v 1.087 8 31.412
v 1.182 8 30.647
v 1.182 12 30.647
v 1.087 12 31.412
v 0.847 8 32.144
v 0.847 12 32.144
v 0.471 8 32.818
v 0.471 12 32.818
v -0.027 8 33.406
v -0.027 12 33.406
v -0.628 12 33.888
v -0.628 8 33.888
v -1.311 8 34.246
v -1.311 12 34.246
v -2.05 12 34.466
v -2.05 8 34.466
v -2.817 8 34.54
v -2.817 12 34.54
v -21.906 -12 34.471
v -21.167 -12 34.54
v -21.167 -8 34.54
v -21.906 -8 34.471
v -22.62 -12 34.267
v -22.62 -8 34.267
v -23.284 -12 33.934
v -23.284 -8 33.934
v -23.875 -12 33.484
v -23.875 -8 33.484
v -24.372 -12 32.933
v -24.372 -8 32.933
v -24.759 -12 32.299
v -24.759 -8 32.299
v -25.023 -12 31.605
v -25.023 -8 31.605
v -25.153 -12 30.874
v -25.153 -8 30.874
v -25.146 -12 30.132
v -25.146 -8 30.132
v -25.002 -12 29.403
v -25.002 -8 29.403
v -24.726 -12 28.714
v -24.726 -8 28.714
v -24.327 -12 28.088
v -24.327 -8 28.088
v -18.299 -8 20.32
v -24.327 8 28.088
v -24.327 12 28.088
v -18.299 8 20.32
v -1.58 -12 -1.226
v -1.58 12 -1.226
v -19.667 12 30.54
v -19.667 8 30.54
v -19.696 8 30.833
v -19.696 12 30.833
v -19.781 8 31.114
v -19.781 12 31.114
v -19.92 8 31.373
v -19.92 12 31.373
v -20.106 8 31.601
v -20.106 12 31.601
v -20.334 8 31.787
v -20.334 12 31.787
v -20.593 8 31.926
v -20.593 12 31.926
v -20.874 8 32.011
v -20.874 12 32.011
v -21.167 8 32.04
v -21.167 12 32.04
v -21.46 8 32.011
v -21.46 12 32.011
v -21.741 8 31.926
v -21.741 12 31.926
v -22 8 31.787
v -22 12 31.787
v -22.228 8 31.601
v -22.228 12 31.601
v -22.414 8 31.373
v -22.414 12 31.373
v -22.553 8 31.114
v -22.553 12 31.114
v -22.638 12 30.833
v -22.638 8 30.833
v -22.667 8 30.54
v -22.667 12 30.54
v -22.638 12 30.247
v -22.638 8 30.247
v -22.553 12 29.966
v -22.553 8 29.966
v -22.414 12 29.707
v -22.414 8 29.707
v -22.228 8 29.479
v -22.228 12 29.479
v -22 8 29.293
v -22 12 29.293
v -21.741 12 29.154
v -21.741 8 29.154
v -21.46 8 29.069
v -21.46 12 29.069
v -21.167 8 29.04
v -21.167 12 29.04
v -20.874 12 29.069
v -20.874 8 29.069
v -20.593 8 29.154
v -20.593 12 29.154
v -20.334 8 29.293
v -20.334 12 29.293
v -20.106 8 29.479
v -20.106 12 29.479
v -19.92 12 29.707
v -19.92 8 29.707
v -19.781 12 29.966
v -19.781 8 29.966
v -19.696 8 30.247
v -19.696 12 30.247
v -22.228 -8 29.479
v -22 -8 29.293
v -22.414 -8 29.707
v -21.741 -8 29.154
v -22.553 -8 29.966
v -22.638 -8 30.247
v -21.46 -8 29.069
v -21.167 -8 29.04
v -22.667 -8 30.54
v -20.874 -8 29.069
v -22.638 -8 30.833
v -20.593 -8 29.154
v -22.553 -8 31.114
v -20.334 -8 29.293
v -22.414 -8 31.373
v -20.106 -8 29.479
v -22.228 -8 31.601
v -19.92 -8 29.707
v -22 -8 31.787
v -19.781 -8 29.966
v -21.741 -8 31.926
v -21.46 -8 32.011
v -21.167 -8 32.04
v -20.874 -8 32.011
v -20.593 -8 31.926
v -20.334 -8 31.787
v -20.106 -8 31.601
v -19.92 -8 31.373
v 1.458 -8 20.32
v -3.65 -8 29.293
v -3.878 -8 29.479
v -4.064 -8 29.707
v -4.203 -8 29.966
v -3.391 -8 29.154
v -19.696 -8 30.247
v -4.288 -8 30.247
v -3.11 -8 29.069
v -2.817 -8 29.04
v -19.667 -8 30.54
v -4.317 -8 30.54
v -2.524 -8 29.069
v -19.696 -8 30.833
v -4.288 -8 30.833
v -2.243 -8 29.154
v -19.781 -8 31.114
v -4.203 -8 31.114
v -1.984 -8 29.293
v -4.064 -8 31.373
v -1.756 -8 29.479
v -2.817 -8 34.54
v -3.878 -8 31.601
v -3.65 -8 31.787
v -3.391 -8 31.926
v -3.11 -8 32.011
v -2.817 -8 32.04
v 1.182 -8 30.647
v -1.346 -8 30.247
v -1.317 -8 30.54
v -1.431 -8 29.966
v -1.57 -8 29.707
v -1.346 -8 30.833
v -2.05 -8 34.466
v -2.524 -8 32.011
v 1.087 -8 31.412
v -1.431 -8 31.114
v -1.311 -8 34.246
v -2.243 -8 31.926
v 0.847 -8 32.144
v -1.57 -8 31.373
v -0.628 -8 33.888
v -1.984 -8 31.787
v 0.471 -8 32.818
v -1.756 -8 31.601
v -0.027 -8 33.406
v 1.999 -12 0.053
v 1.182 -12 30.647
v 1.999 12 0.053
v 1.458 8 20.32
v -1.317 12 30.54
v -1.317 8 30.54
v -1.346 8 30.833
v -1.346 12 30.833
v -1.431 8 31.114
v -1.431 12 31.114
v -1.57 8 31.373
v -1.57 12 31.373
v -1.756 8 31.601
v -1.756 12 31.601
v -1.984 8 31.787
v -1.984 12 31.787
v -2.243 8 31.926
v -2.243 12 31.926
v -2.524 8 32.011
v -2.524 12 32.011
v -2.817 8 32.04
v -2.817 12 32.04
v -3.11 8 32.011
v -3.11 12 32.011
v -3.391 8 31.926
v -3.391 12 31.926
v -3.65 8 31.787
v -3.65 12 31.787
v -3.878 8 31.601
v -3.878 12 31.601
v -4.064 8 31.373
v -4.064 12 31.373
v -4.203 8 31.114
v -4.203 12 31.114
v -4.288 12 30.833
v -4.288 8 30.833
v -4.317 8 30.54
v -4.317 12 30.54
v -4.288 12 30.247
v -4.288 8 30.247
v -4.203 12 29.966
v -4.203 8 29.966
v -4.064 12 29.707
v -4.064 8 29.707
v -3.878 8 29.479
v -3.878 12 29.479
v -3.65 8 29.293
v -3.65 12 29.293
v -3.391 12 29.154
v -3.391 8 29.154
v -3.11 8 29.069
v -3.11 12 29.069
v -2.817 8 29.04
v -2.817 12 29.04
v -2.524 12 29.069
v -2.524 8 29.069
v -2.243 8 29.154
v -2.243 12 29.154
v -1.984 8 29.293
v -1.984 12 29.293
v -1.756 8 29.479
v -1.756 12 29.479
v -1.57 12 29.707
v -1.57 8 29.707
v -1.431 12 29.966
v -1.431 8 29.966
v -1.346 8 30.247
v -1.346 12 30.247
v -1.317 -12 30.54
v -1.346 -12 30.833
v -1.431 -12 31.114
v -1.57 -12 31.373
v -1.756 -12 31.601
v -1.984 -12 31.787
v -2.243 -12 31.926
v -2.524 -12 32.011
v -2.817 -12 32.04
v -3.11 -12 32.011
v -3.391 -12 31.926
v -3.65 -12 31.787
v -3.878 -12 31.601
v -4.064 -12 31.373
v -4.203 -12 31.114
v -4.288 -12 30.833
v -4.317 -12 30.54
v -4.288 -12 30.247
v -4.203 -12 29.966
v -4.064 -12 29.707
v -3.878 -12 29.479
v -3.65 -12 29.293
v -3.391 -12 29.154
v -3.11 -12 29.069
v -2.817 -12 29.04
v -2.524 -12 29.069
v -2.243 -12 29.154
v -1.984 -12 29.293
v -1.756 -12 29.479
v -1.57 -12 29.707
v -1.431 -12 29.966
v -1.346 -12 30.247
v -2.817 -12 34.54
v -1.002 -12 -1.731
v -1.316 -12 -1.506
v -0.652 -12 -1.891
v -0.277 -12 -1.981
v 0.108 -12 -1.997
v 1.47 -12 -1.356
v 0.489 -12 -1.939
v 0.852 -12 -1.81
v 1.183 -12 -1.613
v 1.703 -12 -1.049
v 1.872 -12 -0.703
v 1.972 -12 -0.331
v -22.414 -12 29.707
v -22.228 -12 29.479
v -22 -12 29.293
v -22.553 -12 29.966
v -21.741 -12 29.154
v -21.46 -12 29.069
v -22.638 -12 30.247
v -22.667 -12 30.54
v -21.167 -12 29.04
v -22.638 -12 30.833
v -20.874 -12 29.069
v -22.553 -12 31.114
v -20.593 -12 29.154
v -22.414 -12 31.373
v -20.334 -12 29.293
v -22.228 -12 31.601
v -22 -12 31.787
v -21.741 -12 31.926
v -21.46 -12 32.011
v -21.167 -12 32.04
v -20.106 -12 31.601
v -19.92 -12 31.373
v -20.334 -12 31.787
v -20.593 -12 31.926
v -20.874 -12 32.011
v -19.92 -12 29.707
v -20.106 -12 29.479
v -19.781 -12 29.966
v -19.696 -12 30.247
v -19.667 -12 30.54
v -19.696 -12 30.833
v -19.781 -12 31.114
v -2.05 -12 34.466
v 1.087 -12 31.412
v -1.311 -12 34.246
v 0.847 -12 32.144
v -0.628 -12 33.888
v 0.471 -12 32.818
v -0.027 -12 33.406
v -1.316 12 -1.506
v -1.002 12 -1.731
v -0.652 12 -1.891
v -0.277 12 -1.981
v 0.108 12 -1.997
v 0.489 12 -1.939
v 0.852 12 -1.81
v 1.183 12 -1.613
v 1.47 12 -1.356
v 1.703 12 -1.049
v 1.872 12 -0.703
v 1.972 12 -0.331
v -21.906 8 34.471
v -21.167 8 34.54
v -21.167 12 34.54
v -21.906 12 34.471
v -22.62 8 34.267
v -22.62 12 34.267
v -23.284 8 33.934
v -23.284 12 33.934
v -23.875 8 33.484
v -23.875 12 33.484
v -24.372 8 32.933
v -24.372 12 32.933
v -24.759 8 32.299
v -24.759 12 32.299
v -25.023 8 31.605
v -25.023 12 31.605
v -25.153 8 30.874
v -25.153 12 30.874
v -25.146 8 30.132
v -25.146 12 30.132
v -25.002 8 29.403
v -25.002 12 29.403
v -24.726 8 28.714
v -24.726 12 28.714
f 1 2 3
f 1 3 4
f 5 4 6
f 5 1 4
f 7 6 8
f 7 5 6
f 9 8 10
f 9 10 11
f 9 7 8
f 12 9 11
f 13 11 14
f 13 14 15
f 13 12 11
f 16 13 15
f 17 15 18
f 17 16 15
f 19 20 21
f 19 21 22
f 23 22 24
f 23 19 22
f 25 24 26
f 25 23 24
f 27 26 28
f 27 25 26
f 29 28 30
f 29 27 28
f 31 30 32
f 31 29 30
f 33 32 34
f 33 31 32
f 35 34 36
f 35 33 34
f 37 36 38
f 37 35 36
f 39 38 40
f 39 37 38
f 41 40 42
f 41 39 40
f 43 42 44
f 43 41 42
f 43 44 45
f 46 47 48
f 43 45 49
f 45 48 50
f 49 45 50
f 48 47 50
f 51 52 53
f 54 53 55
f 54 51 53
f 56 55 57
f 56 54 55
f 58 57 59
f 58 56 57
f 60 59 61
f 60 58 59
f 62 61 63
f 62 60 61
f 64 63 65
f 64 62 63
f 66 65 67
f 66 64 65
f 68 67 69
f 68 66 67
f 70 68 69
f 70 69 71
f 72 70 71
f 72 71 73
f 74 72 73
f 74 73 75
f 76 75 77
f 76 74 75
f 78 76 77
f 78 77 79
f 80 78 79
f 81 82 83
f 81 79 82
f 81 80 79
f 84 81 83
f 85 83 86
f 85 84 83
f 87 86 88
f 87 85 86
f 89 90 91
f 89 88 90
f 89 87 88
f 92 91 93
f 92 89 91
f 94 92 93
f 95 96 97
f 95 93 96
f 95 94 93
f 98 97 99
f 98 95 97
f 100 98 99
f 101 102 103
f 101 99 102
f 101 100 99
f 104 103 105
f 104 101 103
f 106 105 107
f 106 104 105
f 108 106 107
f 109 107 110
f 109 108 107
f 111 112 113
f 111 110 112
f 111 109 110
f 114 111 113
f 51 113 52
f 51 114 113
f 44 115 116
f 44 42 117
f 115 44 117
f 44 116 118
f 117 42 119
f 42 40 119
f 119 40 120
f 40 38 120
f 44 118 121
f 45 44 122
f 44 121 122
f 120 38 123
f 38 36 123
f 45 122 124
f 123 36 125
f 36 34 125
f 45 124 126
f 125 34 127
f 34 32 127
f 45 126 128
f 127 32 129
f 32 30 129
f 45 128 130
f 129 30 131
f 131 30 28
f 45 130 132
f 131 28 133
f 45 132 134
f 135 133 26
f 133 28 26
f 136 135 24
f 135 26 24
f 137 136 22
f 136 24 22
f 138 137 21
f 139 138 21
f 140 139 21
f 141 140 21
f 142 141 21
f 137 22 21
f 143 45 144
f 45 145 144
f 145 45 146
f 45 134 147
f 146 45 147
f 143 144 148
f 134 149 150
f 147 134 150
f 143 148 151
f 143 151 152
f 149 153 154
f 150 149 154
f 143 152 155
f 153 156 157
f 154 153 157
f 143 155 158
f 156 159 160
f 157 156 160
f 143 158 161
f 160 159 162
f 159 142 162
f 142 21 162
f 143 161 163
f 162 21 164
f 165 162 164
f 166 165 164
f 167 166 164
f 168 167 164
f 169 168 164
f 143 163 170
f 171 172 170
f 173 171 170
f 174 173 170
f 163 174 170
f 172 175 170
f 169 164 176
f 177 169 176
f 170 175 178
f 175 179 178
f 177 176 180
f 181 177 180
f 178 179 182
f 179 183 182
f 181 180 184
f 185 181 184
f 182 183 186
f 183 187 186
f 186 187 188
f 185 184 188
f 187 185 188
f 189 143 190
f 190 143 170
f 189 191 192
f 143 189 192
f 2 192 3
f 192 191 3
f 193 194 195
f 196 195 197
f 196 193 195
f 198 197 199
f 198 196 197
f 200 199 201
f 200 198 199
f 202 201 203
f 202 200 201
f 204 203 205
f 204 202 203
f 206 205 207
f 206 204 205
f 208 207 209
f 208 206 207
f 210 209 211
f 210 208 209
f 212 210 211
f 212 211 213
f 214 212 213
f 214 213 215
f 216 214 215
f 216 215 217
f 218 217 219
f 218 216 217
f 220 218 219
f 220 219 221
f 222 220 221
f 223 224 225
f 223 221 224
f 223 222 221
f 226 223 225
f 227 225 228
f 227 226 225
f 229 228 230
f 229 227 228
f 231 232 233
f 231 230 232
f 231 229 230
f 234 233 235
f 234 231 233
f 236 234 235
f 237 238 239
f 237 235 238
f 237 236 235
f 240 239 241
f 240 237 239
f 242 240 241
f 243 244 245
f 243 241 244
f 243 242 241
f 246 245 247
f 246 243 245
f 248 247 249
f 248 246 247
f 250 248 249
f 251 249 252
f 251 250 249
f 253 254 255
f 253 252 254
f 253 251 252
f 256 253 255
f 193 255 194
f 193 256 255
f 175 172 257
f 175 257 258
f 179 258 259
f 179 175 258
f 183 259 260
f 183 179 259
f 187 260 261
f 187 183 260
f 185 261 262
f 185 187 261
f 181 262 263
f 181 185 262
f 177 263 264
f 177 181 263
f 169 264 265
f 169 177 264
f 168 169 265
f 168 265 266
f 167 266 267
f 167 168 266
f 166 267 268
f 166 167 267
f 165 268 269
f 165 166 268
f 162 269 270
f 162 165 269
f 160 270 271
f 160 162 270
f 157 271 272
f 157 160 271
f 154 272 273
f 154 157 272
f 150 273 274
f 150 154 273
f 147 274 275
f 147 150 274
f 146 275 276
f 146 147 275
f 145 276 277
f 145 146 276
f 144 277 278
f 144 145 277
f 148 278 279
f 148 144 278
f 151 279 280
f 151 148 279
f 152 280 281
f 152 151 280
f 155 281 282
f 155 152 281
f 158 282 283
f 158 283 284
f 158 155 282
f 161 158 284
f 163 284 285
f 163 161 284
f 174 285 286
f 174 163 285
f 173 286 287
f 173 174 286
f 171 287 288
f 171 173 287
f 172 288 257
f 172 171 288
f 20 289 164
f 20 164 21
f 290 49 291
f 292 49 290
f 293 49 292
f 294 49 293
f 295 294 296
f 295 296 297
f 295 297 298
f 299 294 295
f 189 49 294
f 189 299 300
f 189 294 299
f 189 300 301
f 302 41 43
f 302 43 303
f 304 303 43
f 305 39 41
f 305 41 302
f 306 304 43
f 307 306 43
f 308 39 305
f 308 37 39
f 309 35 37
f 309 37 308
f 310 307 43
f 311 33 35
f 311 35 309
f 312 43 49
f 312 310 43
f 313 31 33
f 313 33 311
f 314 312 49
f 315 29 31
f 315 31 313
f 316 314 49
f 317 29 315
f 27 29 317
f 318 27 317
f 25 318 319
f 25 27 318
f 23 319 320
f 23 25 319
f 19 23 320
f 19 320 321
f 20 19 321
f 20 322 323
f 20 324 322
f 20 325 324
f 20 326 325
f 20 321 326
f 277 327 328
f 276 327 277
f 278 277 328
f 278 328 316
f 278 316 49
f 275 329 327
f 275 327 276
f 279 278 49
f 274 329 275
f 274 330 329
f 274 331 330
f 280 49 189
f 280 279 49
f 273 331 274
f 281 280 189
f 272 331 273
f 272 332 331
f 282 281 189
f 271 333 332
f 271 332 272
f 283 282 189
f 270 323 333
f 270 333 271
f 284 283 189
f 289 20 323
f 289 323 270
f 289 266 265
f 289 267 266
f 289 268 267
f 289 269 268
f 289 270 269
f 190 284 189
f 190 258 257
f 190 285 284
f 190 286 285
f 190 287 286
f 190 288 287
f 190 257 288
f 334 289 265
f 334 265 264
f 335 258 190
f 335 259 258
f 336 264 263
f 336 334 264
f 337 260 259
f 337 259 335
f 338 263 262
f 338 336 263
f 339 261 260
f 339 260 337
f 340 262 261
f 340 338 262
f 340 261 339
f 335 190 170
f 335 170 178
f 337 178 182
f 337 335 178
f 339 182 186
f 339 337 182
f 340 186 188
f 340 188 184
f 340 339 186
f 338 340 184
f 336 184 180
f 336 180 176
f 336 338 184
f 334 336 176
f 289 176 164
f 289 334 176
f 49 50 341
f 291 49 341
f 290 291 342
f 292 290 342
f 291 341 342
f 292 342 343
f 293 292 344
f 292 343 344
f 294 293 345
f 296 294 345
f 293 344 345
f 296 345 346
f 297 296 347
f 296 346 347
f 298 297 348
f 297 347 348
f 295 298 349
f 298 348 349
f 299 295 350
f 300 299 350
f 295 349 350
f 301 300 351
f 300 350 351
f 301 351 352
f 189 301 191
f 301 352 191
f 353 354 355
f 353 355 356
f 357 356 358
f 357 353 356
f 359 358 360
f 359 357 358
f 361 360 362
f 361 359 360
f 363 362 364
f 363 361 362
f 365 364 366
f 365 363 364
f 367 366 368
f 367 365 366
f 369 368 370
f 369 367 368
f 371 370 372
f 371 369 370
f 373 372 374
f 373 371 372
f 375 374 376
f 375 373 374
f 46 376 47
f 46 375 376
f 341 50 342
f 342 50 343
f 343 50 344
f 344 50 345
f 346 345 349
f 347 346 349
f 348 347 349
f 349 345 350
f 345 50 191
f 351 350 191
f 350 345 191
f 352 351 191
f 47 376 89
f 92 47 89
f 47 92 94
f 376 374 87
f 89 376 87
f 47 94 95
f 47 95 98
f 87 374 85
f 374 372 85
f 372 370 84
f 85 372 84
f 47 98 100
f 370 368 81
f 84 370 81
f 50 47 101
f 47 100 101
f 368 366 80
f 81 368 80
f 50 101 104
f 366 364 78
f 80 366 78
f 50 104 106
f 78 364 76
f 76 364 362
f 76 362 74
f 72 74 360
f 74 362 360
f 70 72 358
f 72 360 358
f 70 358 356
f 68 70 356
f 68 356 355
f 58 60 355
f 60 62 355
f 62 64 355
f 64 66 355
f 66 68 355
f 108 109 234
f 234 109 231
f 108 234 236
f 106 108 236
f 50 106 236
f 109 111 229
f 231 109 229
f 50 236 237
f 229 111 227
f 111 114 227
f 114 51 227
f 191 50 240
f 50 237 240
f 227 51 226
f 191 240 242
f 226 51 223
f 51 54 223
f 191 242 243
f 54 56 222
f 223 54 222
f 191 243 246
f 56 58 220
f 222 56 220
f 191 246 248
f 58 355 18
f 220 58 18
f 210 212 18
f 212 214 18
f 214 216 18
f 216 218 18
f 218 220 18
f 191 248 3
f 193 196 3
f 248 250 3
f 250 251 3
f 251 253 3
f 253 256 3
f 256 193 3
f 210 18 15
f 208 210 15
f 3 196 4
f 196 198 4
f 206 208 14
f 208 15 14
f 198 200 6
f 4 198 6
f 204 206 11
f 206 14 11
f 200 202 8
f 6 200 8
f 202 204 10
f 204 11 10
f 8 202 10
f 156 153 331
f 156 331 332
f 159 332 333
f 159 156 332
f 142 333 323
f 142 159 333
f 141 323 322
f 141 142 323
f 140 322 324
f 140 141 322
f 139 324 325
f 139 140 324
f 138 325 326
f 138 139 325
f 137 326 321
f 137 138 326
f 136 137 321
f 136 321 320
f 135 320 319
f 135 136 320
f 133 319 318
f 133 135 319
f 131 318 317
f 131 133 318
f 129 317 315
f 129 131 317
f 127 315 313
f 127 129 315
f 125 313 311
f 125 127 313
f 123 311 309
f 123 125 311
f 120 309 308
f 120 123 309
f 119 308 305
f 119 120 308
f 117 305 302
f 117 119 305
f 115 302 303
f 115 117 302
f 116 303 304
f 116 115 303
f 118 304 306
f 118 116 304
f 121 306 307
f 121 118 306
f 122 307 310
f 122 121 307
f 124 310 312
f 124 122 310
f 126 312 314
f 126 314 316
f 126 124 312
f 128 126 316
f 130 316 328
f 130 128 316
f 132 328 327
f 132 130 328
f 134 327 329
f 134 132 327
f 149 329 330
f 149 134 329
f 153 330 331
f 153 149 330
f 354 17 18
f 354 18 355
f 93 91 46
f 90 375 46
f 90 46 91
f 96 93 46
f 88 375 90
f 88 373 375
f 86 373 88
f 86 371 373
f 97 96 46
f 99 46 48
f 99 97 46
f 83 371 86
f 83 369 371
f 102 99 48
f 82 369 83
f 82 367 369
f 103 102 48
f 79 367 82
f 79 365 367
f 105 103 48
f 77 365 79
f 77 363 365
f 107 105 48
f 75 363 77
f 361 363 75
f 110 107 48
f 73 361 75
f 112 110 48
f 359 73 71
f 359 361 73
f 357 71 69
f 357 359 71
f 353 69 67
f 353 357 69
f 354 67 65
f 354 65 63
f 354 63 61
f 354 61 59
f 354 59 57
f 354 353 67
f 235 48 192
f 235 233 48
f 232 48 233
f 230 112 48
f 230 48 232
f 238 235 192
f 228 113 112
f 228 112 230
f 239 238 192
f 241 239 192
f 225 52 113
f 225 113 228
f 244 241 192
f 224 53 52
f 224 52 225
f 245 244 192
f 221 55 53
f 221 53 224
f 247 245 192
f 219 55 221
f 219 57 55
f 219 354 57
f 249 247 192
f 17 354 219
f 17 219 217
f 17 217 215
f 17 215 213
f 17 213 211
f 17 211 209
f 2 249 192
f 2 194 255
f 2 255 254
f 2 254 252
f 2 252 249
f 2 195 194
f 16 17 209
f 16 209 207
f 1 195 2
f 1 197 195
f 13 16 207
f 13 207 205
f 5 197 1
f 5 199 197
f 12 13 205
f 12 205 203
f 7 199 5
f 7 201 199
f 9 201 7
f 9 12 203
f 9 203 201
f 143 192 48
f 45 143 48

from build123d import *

# Parameters (mm, degrees)
F0_R     = 1.5
F1_DEPTH = 12
F3_DEPTH = 8
F5_DEPTH = 16


with BuildPart() as f1:
    # F0 (on Front) → F1 (new body, symmetric)
    with BuildSketch(Plane.XZ):
        with BuildLine():
            ThreePointArc((-21.167, 34.54), (-24.7592769863, 32.2994163957), (-24.3271555139, 28.0877730268))
            Line((-24.3271555139, 28.0877730268), (-1.5800777569, -1.2261134866))
            ThreePointArc((-1.5800777569, -1.2261134866), (0.6732360047, -1.8832825816), (1.9992859745, 0.0534377403))
            Line((1.9992859745, 0.0534377403), (1.181571949, 30.6468754807))
            ThreePointArc((1.181571949, 30.6468754807), (-0.0266148942, 33.4059642289), (-2.817, 34.54))
            Line((-2.817, 34.54), (-21.167, 34.54))
        make_face()
        with Locations((-21.167, 30.54)):
            Circle(F0_R, mode=Mode.SUBTRACT)
        with Locations((-2.817, 30.54)):
            Circle(F0_R, mode=Mode.SUBTRACT)
    extrude(amount=F1_DEPTH, both=True)

    # F2 (on Front) → F3 (cut, symmetric)
    with BuildSketch(Plane.XZ):
        with BuildLine():
            ThreePointArc((-1.5800777569, -1.2261134866), (0.6732360047, -1.8832825816), (1.9992859745, 0.0534377403))
            Line((1.9992859745, 0.0534377403), (1.181571949, 30.6468754807))
            ThreePointArc((1.181571949, 30.6468754807), (-0.0266148942, 33.4059642289), (-2.817, 34.54))
            Line((-2.817, 34.54), (-21.167, 34.54))
            ThreePointArc((-21.167, 34.54), (-24.7592769863, 32.2994163957), (-24.3271555139, 28.0877730268))
            Line((-24.3271555139, 28.0877730268), (-1.5800777569, -1.2261134866))
        make_face()
    extrude(amount=F3_DEPTH, both=True, mode=Mode.SUBTRACT)

    # F4 (on face) → F5 (join)
    with BuildSketch(Plane.XZ.offset(-8)):
        with BuildLine():
            ThreePointArc((-1.5800777569, -1.2261134866), (0.6732360047, -1.8832825816), (1.9992859745, 0.0534377403))
            Line((1.9992859745, 0.0534377403), (1.4575929373, 20.32))
            Line((1.4575929373, 20.32), (-18.2994956552, 20.32))
            Line((-18.2994956552, 20.32), (-1.5800777569, -1.2261134866))
        make_face()
    extrude(amount=F5_DEPTH)


solid = f1.part
